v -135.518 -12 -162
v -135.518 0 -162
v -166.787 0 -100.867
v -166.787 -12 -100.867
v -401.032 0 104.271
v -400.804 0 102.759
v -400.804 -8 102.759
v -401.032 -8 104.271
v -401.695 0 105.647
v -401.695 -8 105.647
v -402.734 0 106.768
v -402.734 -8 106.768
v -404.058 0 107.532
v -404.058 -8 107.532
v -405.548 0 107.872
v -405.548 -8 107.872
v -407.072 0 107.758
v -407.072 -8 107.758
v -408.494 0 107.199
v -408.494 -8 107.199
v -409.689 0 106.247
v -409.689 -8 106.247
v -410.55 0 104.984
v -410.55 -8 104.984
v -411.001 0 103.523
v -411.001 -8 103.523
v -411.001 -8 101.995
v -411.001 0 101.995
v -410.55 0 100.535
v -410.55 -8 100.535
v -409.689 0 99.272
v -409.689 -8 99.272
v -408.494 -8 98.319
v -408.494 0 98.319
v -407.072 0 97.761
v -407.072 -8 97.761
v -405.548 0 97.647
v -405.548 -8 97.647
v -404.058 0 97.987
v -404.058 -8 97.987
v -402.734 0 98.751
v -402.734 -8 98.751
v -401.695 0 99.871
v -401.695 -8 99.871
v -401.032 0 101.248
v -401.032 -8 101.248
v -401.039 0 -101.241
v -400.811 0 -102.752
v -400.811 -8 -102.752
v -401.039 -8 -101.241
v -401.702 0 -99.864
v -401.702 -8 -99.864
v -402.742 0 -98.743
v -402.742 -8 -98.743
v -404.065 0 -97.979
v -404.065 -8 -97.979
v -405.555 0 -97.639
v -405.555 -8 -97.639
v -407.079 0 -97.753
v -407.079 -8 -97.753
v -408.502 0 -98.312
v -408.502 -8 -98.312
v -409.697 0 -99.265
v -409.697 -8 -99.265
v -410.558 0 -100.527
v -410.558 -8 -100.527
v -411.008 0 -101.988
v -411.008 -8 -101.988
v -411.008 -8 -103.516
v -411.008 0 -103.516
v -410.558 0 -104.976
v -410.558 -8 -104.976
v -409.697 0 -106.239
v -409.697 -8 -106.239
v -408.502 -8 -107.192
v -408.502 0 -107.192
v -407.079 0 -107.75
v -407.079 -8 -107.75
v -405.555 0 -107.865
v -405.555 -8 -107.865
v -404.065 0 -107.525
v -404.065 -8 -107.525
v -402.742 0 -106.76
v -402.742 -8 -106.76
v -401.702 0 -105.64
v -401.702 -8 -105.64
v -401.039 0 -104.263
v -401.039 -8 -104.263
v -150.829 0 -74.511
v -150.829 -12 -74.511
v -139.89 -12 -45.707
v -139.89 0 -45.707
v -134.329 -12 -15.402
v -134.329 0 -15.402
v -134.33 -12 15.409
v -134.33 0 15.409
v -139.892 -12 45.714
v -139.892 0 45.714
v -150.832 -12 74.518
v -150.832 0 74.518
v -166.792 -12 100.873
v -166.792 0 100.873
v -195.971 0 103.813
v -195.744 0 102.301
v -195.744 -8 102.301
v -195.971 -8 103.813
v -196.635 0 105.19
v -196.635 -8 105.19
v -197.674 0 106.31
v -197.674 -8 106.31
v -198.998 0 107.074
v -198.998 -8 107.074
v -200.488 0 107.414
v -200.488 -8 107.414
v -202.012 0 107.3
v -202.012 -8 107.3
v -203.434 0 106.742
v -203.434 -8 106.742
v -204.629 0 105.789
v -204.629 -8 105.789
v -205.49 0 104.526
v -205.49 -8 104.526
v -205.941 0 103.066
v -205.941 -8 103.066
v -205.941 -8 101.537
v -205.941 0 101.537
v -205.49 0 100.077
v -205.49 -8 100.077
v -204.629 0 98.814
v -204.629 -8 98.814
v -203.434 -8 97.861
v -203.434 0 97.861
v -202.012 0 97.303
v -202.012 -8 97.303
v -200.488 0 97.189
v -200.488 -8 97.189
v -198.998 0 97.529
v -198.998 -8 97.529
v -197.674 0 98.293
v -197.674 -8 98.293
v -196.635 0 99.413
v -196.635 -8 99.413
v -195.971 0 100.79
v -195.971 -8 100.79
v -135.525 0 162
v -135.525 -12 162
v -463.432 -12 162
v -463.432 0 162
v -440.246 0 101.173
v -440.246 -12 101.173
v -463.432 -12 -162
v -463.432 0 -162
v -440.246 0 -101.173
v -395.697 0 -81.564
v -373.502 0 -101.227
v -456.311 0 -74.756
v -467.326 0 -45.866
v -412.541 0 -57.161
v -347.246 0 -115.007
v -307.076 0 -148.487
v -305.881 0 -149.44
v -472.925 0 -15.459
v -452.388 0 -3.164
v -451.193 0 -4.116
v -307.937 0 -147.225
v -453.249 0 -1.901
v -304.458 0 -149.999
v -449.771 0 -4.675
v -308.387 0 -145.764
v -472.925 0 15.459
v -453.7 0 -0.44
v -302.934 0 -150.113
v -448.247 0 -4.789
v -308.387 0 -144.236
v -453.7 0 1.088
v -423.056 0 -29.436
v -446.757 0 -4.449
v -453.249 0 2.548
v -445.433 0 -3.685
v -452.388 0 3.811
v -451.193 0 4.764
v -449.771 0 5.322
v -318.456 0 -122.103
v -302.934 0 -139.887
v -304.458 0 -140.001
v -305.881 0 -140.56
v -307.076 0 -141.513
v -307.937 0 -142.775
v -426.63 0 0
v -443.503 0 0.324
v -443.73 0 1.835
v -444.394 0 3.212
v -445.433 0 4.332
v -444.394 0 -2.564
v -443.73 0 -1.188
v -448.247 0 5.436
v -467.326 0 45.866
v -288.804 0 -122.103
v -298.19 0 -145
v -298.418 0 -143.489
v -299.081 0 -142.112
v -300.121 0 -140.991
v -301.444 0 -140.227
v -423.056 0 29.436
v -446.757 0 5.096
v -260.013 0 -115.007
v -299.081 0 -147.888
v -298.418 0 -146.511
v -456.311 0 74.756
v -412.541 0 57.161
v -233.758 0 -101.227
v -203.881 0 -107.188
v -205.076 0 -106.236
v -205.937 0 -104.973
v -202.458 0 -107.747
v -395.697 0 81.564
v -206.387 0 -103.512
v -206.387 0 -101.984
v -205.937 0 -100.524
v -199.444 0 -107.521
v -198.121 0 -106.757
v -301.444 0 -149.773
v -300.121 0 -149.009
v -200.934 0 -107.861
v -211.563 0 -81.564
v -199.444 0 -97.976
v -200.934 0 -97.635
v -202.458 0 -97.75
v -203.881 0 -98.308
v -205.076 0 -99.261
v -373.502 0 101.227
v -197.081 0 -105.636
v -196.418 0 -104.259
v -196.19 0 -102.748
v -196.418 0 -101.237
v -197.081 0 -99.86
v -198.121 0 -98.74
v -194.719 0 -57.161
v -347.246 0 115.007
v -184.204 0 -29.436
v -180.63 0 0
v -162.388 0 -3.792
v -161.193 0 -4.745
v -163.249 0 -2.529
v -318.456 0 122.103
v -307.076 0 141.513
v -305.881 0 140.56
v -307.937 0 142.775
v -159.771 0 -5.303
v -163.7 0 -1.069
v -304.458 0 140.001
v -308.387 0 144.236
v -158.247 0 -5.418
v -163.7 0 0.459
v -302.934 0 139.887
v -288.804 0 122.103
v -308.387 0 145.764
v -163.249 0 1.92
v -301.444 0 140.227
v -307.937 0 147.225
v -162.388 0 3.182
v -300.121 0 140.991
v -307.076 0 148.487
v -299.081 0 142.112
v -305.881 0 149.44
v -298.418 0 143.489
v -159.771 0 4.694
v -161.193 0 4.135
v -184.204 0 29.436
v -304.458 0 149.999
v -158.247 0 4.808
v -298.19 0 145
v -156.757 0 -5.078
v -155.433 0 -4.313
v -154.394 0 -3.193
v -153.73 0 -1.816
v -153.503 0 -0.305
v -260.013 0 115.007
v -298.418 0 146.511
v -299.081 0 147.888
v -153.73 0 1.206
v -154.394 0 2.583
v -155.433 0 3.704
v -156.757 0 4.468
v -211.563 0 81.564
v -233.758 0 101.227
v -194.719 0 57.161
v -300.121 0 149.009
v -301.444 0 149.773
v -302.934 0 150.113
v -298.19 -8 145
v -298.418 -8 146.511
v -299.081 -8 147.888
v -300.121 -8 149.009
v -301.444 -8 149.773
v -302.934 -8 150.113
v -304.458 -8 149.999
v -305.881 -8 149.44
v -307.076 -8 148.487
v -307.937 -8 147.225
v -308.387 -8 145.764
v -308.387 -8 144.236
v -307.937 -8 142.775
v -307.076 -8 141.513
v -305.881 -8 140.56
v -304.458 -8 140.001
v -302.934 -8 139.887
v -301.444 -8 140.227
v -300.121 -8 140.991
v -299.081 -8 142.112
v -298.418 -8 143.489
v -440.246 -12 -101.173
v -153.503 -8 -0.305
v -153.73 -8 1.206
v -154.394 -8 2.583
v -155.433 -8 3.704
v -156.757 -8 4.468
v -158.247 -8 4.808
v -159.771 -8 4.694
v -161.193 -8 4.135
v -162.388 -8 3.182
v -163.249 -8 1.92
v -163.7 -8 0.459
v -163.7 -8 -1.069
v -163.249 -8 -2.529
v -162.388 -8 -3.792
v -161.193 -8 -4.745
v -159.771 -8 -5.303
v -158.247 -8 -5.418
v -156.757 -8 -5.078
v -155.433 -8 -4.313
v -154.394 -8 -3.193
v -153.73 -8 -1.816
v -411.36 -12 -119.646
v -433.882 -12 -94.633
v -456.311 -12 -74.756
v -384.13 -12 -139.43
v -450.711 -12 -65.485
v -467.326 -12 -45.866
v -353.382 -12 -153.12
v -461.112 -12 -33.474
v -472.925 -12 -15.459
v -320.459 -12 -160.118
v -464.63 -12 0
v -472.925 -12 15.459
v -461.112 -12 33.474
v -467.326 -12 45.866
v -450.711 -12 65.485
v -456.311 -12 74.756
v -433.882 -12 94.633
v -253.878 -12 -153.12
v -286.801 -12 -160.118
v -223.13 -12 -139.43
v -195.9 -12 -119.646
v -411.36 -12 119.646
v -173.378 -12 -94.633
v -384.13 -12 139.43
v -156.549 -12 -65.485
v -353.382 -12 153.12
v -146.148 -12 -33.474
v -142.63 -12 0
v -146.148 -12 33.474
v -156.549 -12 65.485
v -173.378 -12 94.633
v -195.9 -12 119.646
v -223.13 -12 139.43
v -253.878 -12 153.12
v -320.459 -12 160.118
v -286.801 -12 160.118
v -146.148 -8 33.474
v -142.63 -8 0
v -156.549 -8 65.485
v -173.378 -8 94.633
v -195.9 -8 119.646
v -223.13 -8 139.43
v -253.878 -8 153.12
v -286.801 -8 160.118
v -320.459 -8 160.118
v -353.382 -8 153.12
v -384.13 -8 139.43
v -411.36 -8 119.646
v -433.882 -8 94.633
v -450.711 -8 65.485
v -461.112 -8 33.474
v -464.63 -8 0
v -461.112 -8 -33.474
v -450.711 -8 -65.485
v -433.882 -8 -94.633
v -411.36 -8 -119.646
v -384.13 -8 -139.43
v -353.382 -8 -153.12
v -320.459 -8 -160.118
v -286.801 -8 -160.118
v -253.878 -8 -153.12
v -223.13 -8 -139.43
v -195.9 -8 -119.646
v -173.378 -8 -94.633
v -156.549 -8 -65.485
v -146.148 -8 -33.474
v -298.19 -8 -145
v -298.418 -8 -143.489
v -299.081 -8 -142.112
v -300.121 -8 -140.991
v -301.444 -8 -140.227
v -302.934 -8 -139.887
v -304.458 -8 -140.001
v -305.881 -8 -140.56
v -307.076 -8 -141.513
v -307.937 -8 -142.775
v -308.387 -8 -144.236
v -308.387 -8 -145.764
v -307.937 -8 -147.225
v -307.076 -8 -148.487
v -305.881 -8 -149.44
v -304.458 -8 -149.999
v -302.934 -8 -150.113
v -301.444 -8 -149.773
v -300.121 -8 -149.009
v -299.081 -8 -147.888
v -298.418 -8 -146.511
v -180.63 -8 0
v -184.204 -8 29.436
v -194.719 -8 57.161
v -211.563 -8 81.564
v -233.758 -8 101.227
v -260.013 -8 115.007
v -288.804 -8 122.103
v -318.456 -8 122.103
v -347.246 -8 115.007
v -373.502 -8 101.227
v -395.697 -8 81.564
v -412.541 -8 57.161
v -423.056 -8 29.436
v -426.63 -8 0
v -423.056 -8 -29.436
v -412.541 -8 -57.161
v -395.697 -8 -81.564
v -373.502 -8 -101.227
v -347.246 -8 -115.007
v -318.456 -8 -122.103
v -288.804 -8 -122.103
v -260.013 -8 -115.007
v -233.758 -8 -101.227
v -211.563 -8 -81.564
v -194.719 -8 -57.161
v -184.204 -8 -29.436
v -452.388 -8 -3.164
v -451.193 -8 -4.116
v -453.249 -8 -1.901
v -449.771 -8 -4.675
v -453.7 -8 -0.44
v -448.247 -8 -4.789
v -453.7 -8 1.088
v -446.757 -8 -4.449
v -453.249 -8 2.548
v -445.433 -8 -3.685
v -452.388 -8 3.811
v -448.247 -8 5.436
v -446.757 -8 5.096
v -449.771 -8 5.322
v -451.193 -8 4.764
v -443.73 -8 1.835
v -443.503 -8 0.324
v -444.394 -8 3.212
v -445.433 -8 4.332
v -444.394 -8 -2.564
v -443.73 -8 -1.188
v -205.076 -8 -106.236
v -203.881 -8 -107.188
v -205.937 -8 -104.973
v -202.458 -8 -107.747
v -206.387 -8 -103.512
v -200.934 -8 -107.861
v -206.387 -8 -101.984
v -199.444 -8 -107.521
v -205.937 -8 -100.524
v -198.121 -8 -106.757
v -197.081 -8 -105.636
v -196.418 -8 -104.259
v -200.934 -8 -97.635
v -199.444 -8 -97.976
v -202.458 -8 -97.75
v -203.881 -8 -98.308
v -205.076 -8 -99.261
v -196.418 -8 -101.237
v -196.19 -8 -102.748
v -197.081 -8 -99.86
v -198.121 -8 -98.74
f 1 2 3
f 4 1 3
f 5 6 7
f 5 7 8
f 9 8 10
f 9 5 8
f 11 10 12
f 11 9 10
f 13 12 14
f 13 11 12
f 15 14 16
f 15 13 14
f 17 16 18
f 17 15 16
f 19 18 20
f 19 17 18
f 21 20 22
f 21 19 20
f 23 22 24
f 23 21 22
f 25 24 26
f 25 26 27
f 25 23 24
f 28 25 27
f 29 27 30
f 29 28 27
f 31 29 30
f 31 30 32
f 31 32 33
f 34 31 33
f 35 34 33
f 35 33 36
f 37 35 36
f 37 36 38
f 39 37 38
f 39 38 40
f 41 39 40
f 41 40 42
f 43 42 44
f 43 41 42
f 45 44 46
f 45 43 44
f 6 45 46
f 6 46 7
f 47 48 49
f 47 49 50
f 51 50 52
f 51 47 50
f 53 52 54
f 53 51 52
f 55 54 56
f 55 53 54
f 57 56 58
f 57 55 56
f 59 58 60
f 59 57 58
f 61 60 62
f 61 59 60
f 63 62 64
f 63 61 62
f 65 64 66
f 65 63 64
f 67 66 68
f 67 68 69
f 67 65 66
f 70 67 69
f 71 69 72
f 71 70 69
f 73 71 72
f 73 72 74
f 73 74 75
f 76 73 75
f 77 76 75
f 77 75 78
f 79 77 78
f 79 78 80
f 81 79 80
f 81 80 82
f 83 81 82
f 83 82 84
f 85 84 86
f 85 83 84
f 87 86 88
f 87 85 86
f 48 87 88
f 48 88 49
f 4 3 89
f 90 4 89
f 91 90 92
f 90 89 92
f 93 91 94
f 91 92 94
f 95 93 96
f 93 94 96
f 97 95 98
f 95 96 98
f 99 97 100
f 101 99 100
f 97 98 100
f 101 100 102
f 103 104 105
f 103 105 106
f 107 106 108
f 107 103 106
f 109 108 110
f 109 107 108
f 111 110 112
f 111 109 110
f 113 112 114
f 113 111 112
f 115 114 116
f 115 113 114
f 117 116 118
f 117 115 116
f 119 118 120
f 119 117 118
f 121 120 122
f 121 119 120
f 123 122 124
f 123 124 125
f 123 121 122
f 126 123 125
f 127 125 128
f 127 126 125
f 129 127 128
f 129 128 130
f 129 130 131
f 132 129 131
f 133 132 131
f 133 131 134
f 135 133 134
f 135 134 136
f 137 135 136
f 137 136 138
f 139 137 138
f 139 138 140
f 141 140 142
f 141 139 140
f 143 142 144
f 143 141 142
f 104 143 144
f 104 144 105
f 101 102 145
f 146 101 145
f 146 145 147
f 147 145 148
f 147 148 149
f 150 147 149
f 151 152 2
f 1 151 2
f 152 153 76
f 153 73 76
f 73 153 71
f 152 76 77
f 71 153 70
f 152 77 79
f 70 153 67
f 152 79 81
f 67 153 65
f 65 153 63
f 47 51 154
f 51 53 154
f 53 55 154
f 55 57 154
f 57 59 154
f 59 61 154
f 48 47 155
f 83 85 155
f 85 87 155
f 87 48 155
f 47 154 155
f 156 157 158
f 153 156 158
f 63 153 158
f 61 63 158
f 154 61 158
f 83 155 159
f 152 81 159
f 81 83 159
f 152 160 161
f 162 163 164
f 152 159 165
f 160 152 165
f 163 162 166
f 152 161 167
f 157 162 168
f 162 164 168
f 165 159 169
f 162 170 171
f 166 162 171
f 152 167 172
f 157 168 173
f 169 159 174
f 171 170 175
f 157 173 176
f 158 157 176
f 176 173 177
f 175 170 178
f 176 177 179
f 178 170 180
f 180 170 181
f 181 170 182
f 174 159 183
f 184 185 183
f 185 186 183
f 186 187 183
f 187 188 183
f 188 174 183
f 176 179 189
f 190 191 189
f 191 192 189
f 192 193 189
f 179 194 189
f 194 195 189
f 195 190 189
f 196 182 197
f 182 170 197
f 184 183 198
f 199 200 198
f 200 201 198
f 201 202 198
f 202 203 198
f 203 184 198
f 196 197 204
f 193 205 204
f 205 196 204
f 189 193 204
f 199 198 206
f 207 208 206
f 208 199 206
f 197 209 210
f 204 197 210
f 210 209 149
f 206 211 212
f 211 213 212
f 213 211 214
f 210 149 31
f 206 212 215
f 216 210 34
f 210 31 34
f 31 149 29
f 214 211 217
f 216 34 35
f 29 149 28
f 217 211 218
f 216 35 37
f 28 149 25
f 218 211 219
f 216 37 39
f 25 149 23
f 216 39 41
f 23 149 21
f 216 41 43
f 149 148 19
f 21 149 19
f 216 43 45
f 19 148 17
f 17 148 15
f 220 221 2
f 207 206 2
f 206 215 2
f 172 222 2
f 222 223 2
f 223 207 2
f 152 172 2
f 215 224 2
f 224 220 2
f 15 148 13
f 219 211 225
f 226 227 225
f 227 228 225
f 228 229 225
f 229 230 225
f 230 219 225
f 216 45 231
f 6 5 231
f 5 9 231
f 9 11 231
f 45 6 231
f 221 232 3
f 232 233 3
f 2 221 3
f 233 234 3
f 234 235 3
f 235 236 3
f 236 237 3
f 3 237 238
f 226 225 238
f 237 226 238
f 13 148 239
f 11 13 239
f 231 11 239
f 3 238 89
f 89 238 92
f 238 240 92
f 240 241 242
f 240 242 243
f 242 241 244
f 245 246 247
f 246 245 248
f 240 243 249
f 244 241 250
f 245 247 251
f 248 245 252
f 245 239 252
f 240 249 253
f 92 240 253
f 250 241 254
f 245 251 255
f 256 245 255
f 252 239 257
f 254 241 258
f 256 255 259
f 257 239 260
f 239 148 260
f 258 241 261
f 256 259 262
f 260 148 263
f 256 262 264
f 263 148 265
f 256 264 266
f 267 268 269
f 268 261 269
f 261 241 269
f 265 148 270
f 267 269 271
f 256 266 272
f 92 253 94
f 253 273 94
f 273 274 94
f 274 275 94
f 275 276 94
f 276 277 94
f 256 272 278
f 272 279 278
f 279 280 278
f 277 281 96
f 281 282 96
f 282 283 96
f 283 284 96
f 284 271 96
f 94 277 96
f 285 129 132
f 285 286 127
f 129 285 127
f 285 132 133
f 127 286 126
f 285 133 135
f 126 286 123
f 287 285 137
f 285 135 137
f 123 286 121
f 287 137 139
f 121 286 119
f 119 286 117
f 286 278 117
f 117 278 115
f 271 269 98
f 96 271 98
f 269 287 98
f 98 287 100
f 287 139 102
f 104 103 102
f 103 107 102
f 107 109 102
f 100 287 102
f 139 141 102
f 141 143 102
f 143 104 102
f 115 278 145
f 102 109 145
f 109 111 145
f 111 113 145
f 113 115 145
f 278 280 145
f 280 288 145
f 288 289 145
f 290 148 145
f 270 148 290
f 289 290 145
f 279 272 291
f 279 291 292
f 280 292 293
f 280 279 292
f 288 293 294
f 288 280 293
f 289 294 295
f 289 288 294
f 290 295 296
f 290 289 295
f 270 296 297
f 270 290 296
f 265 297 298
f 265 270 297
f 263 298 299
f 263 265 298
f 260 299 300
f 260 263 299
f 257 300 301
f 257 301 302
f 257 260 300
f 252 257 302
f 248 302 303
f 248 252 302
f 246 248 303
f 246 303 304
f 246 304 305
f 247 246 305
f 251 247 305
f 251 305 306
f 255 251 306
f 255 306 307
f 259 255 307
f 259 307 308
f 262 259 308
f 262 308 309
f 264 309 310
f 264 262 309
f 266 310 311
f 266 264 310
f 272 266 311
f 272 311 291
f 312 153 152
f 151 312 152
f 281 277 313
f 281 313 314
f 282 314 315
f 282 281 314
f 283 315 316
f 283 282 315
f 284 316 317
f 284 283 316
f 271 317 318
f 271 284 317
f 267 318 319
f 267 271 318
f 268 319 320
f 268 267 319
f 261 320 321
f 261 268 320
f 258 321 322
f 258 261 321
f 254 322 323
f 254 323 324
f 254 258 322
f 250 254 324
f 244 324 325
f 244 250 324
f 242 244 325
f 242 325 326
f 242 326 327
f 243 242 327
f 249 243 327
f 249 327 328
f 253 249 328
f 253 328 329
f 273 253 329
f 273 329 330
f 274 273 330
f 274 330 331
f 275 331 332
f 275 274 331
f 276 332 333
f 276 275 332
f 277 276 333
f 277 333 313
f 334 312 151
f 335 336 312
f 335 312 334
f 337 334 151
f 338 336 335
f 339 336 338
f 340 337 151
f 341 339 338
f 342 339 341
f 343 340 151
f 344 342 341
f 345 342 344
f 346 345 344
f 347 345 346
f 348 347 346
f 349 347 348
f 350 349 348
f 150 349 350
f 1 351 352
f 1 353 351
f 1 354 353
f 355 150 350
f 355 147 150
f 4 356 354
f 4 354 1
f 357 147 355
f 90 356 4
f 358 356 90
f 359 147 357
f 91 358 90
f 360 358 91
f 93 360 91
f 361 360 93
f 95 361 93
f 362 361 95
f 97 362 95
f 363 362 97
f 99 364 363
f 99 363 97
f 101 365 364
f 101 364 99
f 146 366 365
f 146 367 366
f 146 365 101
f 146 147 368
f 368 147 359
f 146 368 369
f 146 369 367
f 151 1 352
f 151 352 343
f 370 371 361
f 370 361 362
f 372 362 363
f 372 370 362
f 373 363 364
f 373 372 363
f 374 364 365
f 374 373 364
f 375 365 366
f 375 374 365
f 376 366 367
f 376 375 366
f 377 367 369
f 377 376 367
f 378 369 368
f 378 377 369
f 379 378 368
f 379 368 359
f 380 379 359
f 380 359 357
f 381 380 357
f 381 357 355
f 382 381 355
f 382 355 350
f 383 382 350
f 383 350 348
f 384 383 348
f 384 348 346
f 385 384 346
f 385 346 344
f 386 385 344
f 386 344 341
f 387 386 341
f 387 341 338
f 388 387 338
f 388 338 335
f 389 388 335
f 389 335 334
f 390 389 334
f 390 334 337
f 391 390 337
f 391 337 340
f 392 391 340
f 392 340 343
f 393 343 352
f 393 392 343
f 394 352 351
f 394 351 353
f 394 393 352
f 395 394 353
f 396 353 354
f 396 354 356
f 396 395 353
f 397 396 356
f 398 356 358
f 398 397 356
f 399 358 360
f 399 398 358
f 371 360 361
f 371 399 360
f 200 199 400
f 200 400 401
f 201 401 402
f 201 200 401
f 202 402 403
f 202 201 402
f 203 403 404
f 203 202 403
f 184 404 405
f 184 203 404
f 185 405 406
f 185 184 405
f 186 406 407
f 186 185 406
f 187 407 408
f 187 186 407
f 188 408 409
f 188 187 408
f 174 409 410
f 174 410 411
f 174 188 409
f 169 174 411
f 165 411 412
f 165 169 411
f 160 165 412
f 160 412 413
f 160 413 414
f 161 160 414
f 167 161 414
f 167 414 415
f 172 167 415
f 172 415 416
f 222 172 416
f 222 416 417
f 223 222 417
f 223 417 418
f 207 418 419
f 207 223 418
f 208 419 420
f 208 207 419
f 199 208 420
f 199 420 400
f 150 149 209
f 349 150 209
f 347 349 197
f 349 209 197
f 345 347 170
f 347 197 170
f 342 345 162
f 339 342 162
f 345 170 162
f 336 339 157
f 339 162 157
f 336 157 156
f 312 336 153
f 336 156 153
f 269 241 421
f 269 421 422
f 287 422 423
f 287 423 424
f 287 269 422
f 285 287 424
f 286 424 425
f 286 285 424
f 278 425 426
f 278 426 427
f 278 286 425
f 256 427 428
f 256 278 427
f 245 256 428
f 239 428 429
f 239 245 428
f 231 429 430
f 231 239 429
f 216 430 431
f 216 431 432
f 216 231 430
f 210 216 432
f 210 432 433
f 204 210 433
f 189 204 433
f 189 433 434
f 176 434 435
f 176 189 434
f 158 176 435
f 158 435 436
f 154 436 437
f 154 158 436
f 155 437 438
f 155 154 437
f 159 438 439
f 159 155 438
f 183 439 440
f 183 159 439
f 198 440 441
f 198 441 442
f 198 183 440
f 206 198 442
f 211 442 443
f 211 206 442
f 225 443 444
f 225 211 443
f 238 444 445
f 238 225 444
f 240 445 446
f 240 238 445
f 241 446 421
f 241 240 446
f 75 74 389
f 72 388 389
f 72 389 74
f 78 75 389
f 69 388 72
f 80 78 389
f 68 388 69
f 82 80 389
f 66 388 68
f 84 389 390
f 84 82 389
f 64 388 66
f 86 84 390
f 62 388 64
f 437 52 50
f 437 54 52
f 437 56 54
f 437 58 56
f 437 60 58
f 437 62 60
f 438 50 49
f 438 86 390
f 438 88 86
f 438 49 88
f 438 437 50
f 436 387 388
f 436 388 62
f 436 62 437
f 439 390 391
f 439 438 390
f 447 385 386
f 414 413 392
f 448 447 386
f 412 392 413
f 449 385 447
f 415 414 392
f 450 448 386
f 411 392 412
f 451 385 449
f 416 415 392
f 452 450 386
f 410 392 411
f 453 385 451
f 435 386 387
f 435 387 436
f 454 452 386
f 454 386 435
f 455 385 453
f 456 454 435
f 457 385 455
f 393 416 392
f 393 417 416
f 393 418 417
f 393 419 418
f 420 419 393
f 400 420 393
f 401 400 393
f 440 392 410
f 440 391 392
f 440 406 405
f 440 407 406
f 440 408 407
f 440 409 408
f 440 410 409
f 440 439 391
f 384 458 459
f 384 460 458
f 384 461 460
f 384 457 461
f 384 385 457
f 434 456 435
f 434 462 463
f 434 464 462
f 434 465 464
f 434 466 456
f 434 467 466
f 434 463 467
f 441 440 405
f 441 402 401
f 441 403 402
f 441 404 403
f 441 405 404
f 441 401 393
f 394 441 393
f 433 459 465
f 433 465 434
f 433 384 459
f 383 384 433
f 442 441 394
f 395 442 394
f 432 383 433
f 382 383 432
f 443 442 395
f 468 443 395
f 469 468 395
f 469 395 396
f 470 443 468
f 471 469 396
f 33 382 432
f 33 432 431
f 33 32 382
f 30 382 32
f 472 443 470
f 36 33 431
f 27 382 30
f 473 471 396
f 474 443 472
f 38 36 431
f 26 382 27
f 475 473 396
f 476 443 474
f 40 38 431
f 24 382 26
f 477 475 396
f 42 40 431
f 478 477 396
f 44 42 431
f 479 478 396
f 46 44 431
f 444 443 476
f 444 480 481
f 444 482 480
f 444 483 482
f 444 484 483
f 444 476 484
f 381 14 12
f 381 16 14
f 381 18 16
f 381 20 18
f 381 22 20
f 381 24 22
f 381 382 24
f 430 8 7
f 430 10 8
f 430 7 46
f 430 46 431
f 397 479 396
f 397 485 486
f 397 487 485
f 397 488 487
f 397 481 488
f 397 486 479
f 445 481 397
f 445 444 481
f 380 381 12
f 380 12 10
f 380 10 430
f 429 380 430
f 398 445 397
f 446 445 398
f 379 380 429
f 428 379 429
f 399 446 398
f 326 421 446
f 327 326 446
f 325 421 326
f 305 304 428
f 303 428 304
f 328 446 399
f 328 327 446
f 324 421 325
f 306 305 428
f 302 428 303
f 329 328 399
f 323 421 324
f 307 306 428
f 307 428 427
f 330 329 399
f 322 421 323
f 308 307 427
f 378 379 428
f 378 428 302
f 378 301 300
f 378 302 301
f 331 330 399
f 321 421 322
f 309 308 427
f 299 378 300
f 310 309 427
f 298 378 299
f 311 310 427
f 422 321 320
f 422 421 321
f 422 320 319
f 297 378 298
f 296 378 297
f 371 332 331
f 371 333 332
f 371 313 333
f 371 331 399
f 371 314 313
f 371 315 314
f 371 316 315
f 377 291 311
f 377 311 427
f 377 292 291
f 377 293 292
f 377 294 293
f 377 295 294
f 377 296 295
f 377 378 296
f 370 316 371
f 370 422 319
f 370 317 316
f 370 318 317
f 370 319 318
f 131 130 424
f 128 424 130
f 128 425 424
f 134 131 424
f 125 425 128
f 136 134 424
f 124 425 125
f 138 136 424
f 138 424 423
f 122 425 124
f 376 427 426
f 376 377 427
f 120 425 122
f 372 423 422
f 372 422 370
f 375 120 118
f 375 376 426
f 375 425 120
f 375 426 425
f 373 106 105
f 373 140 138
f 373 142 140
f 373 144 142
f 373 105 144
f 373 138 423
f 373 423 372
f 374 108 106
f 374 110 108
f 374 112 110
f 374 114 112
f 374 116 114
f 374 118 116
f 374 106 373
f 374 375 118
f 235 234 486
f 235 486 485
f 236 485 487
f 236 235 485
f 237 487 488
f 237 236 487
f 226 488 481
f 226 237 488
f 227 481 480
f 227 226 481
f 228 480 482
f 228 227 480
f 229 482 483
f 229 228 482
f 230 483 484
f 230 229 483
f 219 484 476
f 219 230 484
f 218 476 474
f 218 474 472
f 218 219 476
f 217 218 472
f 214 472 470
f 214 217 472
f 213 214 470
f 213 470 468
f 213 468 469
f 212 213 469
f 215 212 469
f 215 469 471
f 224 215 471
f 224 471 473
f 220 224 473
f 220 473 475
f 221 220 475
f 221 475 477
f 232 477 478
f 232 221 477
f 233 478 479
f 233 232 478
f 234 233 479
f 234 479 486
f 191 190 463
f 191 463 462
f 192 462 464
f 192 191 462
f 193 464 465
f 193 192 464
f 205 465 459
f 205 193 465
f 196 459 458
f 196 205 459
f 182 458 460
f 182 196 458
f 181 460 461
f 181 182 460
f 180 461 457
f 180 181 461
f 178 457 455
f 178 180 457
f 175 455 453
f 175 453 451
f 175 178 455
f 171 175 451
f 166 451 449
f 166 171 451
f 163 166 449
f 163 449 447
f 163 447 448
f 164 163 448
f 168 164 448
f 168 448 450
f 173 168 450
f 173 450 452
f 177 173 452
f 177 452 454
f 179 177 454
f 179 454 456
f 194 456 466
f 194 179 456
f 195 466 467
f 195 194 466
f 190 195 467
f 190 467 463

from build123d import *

# Parameters (mm, degrees)
F0_R     = 161
F0_R_2   = 5.127079
F0_R_3   = 123
F1_DEPTH = 8
F2_DEPTH = 12


with BuildPart() as f1:
    # F0 (on Front) → F1 (new body)
    with BuildSketch(Plane.XZ):
        with Locations((-303.629764, 0)):
            Circle(F0_R)
        with Locations((-405.93836, -102.751891)):
            Circle(F0_R_2, mode=Mode.SUBTRACT)
        with Locations((-303.317233, -145)):
            Circle(F0_R_2, mode=Mode.SUBTRACT)
        with Locations((-201.317497, -102.748236)):
            Circle(F0_R_2, mode=Mode.SUBTRACT)
        with Locations((-158.629764, -0.304881)):
            Circle(F0_R_2, mode=Mode.SUBTRACT)
        with Locations((-448.629764, 0.323695)):
            Circle(F0_R_2, mode=Mode.SUBTRACT)
        with Locations((-405.930929, 102.75929)):
            Circle(F0_R_2, mode=Mode.SUBTRACT)
        with Locations((-303.629764, 0)):
            Circle(F0_R_3, mode=Mode.SUBTRACT)
        with Locations((-303.317233, 145)):
            Circle(F0_R_2, mode=Mode.SUBTRACT)
        with Locations((-200.870767, 102.301459)):
            Circle(F0_R_2, mode=Mode.SUBTRACT)
    extrude(amount=F1_DEPTH)

    # F0 (on Front) → F2 (join)
    with BuildSketch(Plane.XZ):
        with BuildLine():
            Line((-135.525019, 162), (-463.432019, 162))
            Line((-463.432019, 162), (-440.246351, 101.172665))
            ThreePointArc((-440.246351, 101.172665), (-473.629764, 0), (-440.246351, -101.172665))
            Line((-440.246351, -101.172665), (-463.432019, -162))
            Line((-463.432019, -162), (-135.518019, -162))
            Line((-135.518019, -162), (-166.787395, -100.867071))
            ThreePointArc((-166.787395, -100.867071), (-133.629764, 0.003823), (-166.791931, 100.873225))
            Line((-166.791931, 100.873225), (-135.525019, 162))
        make_face()
        with Locations((-303.629764, 0)):
            Circle(F0_R, mode=Mode.SUBTRACT)
    extrude(amount=F2_DEPTH)


solid = f1.part
